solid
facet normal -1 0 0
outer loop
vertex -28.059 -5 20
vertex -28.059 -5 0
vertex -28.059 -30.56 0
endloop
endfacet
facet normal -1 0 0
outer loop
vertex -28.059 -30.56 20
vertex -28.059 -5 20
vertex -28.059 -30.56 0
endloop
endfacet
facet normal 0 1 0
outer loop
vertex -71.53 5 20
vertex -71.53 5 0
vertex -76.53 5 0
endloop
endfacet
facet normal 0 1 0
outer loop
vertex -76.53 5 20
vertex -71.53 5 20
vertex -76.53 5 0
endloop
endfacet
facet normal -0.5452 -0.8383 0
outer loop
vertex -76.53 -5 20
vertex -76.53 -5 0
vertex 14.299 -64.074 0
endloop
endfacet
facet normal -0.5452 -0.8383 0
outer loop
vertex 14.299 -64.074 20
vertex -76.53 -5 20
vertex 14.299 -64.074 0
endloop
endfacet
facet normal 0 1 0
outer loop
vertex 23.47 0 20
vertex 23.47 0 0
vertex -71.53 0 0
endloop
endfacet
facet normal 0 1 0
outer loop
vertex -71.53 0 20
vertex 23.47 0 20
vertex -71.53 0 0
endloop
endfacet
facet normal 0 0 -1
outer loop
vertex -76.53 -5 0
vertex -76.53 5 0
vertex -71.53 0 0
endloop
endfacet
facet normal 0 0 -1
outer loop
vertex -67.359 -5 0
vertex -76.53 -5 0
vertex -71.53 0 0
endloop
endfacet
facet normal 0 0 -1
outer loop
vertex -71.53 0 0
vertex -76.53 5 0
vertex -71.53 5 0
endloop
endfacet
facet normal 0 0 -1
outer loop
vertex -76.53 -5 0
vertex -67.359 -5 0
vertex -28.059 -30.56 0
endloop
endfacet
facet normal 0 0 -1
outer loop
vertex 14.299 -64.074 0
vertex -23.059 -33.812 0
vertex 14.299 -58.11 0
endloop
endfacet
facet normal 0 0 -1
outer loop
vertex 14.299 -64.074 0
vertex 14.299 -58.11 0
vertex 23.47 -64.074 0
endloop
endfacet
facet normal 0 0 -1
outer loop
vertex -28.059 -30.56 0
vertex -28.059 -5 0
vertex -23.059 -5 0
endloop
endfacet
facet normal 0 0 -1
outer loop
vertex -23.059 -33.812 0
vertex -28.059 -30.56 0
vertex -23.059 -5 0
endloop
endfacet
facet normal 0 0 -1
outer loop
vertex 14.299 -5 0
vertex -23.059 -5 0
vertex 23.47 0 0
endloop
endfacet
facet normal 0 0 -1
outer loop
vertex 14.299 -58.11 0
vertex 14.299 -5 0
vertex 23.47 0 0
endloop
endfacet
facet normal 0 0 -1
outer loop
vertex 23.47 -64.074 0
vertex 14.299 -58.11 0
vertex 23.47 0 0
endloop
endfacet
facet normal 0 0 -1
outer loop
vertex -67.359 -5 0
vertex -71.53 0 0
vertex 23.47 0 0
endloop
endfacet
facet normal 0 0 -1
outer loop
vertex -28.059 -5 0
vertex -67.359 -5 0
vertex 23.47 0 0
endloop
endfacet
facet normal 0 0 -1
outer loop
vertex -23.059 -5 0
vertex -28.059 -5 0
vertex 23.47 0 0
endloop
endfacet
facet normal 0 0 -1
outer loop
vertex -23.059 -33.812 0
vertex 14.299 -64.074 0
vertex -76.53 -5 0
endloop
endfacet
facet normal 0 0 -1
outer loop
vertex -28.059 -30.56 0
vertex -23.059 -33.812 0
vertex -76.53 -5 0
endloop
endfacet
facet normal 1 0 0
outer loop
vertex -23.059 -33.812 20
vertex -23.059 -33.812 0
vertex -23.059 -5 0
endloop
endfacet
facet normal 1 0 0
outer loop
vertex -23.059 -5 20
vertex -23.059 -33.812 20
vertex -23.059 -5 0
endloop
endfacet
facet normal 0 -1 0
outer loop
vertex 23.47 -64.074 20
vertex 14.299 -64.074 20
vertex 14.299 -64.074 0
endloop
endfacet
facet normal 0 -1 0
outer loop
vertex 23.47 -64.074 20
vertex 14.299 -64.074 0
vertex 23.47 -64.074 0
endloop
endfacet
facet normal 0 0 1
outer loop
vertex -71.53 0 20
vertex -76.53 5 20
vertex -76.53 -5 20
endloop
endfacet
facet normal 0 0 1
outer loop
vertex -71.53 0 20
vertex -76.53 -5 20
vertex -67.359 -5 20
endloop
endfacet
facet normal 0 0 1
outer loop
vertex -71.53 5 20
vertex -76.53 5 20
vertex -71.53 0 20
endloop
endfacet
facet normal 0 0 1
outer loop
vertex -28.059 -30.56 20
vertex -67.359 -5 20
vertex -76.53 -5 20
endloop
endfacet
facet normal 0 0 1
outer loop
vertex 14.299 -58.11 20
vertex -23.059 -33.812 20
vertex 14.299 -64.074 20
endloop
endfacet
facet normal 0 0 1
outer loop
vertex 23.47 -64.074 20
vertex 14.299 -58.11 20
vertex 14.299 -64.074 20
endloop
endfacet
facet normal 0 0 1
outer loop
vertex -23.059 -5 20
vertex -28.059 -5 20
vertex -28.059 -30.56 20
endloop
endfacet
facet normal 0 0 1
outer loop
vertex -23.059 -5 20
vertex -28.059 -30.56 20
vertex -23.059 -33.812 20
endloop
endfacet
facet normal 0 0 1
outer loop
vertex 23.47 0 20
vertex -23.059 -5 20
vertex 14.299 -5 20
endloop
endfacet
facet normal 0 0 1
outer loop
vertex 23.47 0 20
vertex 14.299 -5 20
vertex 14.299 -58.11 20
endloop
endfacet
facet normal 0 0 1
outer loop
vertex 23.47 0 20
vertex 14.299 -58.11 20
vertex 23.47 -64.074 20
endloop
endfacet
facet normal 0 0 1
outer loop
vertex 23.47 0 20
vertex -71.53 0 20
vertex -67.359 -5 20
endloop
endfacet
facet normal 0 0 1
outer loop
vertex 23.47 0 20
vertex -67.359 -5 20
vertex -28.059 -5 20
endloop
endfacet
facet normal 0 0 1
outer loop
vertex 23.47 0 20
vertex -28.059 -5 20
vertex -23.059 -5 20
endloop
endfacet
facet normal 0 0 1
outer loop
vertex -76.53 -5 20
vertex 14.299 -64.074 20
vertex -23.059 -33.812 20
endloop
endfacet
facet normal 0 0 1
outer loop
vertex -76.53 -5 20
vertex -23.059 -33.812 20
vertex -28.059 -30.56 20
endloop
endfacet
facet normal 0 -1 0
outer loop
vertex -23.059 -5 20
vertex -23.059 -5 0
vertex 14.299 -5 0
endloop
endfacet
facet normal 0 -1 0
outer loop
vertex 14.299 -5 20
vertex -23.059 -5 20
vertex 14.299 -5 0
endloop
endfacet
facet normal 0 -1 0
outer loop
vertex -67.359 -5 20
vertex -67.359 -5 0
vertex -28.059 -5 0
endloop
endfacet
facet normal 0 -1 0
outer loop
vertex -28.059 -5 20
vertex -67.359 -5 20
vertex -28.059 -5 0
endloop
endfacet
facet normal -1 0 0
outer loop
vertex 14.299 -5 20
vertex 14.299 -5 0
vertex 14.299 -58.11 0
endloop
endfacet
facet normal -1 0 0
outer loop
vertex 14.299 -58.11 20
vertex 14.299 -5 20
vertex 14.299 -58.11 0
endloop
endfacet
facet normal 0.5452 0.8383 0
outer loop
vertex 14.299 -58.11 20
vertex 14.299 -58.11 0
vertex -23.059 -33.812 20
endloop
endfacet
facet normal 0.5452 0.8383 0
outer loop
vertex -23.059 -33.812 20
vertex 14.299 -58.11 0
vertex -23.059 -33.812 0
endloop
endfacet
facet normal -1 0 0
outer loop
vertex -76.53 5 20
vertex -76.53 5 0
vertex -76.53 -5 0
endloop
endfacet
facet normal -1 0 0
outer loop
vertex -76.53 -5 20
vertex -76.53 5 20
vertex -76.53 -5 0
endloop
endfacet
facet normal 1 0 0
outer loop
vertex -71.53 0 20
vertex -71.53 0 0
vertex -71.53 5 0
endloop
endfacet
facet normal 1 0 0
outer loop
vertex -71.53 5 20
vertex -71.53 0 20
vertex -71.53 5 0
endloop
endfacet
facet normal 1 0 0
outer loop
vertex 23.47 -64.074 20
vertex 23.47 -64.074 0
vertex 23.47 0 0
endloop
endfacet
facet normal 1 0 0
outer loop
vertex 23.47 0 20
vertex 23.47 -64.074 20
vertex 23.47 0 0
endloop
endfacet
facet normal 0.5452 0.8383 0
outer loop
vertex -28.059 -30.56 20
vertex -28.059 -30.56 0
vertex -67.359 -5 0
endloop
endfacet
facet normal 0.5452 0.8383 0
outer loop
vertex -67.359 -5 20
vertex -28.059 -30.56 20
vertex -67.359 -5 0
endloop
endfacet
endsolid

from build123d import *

# Parameters (mm, degrees)
F1_DEPTH = 20


with BuildPart() as f1:
    # F0 (on Top) → F1 (new body)
    with BuildSketch(Plane.XY):
        Polygon((23.470087, -5), (23.470087, 0), (-71.529913, 0), (-71.529913, 5), (-76.529913, 5), (-76.529913, 0), (-76.529913, -5), (-67.359267, -5), (-28.059433, -5), (-23.059433, -5), (14.299441, -5), align=None)
        Polygon((23.470087, -64.074456), (23.470087, -5), (14.299441, -5), (14.299441, -58.109964), align=None)
        Polygon((14.299441, -64.074456), (23.470087, -64.074456), (14.299441, -58.109964), align=None)
        Polygon((14.299441, -64.074456), (14.299441, -58.109964), (-23.059433, -33.812146), (-28.059433, -30.560198), (-67.359267, -5), (-76.529913, -5), align=None)
        Polygon((-23.059433, -33.812146), (-23.059433, -5), (-28.059433, -5), (-28.059433, -30.560198), align=None)
    extrude(amount=F1_DEPTH)


solid = f1.part
